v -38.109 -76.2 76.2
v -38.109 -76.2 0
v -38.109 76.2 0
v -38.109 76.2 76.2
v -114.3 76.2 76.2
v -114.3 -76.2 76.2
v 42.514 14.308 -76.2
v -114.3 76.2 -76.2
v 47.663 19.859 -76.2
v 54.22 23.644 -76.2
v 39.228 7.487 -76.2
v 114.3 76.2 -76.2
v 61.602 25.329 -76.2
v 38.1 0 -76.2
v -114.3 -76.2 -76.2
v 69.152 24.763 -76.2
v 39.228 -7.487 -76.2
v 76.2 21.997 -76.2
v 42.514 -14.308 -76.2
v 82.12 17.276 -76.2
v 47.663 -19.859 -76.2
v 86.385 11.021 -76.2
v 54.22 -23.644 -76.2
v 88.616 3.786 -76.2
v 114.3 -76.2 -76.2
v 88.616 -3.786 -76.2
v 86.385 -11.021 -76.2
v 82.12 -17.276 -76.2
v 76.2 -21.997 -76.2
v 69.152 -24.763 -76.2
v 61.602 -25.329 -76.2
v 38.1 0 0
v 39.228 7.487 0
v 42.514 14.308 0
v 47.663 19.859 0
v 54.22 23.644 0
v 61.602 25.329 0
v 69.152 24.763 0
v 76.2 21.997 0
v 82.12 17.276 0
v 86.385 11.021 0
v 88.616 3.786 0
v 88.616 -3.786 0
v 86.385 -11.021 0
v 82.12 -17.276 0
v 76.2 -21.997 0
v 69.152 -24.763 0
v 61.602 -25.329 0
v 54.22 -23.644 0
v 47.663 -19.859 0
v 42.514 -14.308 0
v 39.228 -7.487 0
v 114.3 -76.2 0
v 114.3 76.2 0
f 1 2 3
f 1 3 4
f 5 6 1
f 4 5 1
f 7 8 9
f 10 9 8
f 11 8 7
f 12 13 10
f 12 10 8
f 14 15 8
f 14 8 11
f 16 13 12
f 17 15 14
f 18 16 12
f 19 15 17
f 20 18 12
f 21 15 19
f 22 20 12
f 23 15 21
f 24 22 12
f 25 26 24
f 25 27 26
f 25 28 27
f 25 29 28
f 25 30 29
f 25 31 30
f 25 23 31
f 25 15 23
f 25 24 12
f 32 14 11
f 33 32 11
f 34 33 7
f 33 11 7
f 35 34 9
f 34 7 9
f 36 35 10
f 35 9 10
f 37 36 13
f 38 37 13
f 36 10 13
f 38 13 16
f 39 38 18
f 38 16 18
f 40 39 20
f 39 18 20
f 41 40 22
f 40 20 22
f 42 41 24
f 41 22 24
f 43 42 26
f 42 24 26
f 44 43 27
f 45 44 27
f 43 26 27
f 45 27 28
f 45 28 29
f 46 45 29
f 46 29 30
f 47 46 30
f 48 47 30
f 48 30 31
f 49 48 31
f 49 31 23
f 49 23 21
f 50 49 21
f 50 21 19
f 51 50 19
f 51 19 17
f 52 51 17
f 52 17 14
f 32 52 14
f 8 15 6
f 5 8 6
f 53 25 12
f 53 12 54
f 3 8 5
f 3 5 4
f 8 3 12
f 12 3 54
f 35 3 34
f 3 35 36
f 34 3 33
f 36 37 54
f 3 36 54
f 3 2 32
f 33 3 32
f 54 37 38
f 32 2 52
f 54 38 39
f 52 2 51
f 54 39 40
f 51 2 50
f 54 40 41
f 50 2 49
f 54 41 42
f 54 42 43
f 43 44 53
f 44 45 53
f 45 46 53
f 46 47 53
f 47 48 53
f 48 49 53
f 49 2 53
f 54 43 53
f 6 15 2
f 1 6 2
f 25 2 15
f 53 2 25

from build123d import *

# Parameters (mm, degrees)
F0_W     = 228.6
F0_H     = 152.4
F1_DEPTH = 76.2
F2_W     = 152.408811
F2_H     = 76.2
F3_DEPTH = 152.401
F5_D     = 50.8


with BuildPart() as f1:
    # F0 (on Front) → F1 (new body, symmetric)
    with BuildSketch(Plane.XZ):
        Rectangle(F0_W, F0_H)
    extrude(amount=F1_DEPTH, both=True)

    # F2 (on face) → F3 (cut, through all)
    with BuildSketch(Plane.XZ.offset(76.2)):
        with Locations((38.095595, 38.1)):
            Rectangle(F2_W, F2_H)
    extrude(amount=-F3_DEPTH, mode=Mode.SUBTRACT)

    # F5 (through all)
    with Locations(Plane.XY):
        with Locations((63.5, 0)):
            Hole(F5_D / 2)


solid = f1.part
